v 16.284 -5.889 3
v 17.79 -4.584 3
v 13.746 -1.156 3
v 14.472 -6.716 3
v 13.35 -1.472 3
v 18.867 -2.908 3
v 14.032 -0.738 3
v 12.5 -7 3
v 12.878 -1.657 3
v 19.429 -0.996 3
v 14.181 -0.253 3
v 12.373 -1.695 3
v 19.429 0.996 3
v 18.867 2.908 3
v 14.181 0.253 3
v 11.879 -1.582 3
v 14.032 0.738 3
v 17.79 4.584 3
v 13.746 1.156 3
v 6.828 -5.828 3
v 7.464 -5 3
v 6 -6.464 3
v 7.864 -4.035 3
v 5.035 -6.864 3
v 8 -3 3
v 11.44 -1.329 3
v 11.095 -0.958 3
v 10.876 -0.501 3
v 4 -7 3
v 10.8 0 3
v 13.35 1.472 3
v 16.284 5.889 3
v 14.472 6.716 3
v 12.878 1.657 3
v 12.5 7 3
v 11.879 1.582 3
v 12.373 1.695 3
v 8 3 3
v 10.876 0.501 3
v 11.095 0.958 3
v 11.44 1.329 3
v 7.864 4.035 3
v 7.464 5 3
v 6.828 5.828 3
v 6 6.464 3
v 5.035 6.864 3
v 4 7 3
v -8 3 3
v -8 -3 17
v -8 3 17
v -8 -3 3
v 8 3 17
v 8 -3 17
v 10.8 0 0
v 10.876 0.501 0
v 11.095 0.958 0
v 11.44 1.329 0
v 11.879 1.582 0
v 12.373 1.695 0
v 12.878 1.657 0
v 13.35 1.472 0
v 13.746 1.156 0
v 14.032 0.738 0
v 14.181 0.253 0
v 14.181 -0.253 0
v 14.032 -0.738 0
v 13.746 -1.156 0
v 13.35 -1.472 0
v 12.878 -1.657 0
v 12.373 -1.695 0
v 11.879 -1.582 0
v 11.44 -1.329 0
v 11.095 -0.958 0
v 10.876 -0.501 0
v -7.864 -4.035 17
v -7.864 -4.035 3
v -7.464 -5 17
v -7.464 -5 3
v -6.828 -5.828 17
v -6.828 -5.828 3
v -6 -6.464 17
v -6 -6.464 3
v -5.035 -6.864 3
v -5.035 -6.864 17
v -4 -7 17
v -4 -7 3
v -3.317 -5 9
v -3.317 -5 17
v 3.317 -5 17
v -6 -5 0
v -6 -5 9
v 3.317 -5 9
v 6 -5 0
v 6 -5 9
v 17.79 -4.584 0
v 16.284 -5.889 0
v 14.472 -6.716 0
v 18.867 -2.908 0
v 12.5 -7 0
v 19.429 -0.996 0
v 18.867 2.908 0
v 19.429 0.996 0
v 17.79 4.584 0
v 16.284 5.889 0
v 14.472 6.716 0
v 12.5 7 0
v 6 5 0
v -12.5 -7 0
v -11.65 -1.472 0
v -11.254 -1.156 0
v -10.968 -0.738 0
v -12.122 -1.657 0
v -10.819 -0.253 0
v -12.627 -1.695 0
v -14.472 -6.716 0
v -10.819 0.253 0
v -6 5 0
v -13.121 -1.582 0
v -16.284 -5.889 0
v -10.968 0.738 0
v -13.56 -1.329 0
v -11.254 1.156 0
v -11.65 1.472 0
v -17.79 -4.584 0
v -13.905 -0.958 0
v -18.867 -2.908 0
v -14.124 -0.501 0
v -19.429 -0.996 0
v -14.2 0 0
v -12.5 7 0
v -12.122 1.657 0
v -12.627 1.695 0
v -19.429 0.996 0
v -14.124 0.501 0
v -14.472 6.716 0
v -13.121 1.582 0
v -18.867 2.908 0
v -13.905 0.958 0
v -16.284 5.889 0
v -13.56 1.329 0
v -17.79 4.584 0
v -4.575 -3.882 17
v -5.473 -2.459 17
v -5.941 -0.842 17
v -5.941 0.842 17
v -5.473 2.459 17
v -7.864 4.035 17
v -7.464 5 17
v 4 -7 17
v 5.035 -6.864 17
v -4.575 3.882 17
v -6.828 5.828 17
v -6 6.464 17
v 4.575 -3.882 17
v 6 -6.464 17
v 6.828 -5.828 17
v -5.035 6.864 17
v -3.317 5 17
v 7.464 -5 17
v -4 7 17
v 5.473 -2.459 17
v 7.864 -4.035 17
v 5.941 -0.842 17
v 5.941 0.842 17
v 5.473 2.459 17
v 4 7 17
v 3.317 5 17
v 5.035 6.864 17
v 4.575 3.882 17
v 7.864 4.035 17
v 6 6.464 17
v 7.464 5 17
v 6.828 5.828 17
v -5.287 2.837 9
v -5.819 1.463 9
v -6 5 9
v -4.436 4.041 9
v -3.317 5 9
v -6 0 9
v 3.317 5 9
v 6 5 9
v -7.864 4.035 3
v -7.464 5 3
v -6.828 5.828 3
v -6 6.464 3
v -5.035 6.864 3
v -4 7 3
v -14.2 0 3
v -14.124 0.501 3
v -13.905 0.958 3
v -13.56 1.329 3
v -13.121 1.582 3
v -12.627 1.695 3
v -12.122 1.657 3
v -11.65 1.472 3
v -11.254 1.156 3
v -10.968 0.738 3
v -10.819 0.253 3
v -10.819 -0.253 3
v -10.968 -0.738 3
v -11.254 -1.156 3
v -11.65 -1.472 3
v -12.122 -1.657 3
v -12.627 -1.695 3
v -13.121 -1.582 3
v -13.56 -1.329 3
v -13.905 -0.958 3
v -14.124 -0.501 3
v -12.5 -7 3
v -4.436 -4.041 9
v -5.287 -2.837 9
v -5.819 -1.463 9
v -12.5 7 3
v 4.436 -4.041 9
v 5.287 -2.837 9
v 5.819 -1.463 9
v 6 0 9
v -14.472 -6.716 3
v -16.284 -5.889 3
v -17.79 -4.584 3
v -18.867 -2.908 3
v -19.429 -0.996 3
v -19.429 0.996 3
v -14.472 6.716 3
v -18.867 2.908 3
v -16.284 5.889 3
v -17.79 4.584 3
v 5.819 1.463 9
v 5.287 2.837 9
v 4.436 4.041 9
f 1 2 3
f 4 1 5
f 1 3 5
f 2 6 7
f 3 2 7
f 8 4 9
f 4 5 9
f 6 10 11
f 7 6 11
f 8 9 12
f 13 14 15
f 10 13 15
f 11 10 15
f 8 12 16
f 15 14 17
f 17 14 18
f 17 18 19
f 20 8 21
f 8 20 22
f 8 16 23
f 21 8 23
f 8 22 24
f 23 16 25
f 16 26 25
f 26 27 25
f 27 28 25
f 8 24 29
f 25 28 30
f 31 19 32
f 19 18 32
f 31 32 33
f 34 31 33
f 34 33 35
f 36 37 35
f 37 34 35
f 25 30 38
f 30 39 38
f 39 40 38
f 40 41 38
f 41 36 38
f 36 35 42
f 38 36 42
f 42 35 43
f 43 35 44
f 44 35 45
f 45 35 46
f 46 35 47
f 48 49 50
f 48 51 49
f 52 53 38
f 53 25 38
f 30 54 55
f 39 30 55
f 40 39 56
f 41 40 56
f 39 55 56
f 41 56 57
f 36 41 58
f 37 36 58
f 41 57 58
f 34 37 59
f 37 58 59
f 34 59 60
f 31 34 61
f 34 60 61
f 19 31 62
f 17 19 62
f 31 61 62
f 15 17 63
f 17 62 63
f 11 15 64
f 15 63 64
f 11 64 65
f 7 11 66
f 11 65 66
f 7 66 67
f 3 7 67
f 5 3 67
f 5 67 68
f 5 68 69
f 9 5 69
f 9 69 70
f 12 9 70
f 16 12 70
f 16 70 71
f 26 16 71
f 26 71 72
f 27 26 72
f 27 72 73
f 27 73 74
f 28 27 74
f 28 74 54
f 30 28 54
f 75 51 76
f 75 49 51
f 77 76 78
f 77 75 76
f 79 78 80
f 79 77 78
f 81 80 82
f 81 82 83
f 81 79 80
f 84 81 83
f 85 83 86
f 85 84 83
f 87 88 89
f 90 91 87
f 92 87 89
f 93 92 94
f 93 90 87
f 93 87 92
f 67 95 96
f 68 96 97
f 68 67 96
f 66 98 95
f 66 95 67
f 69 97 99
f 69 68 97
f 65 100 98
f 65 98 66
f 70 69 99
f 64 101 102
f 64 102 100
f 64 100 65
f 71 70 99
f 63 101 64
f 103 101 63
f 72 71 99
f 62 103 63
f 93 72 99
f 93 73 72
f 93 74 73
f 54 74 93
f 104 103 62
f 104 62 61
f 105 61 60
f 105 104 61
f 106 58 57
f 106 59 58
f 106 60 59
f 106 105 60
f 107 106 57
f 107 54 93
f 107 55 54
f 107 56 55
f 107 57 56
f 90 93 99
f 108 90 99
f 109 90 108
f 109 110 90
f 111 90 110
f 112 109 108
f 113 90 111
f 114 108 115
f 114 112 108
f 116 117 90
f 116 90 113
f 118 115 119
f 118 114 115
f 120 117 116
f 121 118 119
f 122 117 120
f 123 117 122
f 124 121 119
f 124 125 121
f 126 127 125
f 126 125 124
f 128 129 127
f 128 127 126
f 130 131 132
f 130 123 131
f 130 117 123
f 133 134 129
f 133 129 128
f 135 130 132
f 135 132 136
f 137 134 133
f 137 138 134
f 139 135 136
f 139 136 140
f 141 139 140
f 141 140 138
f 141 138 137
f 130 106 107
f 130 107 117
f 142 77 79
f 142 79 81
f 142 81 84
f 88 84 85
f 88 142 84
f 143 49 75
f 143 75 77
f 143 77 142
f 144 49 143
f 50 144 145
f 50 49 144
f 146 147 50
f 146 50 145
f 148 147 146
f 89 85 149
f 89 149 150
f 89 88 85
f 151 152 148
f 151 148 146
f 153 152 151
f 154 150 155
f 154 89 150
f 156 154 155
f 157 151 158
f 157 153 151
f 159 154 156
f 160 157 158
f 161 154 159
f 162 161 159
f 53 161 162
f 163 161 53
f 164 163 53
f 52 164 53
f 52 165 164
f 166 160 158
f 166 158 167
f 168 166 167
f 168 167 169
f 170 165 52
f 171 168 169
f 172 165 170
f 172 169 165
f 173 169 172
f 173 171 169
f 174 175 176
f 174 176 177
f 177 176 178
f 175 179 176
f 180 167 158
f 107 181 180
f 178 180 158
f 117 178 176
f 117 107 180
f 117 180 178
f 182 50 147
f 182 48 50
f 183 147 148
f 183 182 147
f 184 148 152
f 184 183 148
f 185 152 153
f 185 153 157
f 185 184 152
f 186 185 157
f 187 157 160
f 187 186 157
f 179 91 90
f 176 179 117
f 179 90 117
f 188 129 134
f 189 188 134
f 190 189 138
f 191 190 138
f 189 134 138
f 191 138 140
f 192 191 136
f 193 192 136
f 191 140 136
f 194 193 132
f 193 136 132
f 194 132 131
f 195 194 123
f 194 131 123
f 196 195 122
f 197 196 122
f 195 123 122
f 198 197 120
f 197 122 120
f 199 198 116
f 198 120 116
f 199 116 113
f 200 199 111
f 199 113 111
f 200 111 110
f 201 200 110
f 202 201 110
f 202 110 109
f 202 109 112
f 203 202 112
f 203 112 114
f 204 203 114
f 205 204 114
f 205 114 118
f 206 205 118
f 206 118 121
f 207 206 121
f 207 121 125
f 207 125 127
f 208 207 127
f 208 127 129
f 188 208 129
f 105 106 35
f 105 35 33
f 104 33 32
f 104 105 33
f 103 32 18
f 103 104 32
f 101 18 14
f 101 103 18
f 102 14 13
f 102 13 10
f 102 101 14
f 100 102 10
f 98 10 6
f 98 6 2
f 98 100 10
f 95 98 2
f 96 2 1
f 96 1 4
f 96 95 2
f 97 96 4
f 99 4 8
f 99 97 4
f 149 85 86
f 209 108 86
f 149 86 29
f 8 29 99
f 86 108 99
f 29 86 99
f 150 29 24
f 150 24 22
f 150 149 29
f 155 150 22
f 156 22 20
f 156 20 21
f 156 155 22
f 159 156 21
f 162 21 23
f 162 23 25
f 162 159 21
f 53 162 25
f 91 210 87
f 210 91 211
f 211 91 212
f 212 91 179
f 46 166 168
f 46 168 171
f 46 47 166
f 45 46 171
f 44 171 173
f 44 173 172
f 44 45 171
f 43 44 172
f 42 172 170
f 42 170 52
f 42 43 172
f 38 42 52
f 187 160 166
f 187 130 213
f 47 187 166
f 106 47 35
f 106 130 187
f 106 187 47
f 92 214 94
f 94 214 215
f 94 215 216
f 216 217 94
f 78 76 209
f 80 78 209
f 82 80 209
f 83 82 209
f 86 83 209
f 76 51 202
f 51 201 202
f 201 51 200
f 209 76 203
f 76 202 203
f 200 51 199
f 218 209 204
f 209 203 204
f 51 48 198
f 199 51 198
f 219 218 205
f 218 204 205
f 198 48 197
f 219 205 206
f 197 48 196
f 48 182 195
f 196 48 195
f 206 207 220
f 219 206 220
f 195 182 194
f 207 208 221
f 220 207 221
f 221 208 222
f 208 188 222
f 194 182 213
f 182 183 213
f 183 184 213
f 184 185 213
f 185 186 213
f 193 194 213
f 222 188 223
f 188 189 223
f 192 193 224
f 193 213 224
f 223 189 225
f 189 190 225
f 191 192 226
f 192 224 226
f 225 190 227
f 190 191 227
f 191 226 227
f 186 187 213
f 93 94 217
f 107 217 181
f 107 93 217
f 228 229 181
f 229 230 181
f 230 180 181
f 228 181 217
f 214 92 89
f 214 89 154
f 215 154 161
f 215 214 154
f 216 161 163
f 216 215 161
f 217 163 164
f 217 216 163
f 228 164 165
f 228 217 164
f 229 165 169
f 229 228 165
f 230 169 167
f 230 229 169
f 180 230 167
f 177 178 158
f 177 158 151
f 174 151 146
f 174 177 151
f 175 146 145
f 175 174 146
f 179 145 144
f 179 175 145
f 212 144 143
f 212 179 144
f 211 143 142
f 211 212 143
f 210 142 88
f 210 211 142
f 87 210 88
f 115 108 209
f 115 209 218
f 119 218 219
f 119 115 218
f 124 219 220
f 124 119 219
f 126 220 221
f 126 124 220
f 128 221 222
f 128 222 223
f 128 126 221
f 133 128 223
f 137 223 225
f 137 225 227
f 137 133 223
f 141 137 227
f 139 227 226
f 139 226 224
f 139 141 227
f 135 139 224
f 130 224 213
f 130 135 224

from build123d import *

# Parameters (mm, degrees)
SKETCH1_W                = 12
SKETCH1_H                = 10
BOSS_EXTRUDE3_DEPTH      = 3
SKETCH4_W                = 16
SKETCH4_H                = 14
SKETCH4_W_2              = 12
SKETCH4_H_2              = 10
BOSS_EXTRUDE4_DEPTH      = 6
SKETCH5_W                = 16
SKETCH5_H                = 14
BOSS_EXTRUDE5_DEPTH      = 8
M3_CLEARANCE_HOLE1_D     = 3.4
M3_CLEARANCE_HOLE1_DEPTH = 12
M3_CLEARANCE_HOLE1_TIP   = 1.021463052
FILLET1_R                = 4


with BuildPart() as part:
    # Sketch1 → Boss-Extrude3 (new body)
    with BuildSketch(Plane.XY):
        with BuildLine():
            Line((-12.5, 7), (12.5, 7))
            ThreePointArc((12.5, 7), (19.5, 0), (12.5, -7))
            Line((12.5, -7), (-12.5, -7))
            ThreePointArc((-12.5, -7), (-19.5, 0), (-12.5, 7))
        make_face()
        Rectangle(SKETCH1_W, SKETCH1_H, mode=Mode.SUBTRACT)
    extrude(amount=BOSS_EXTRUDE3_DEPTH)

    # Sketch4 → Boss-Extrude4 (add)
    with BuildSketch(Plane.XY.offset(3)):
        Rectangle(SKETCH4_W, SKETCH4_H)
        Rectangle(SKETCH4_W_2, SKETCH4_H_2, mode=Mode.SUBTRACT)
    extrude(amount=BOSS_EXTRUDE4_DEPTH)

    # Sketch5 → Boss-Extrude5 (add)
    with BuildSketch(Plane.XY.offset(9)):
        Rectangle(SKETCH5_W, SKETCH5_H)
        with BuildLine():
            Line((3.31662479, 5), (-3.31662479, 5))
            ThreePointArc((-3.31662479, 5), (-6, 0), (-3.31662479, -5))
            Line((-3.31662479, -5), (3.31662479, -5))
            ThreePointArc((3.31662479, -5), (6, 0), (3.31662479, 5))
        make_face(mode=Mode.SUBTRACT)
    extrude(amount=BOSS_EXTRUDE5_DEPTH)

    # M3 Clearance Hole1
    with Locations(Plane.XY.offset(3)):
        with Locations((-12.5, 0), (12.5, 0)):
            Hole(M3_CLEARANCE_HOLE1_D / 2, depth=M3_CLEARANCE_HOLE1_DEPTH)
            with Locations((0, 0, -(M3_CLEARANCE_HOLE1_DEPTH + M3_CLEARANCE_HOLE1_TIP / 2))):  # 118° drill point
                Cone(0, M3_CLEARANCE_HOLE1_D / 2, M3_CLEARANCE_HOLE1_TIP, mode=Mode.SUBTRACT)

    # Fillet1
    fillet1_edges = [part.edges().sort_by_distance(p)[0] for p in [
        (8, -7, 10),
        (8, 7, 10),
        (-8, 7, 10),
        (-8, -7, 10),
    ]]
    fillet(fillet1_edges, radius=FILLET1_R)


solid = part.part
